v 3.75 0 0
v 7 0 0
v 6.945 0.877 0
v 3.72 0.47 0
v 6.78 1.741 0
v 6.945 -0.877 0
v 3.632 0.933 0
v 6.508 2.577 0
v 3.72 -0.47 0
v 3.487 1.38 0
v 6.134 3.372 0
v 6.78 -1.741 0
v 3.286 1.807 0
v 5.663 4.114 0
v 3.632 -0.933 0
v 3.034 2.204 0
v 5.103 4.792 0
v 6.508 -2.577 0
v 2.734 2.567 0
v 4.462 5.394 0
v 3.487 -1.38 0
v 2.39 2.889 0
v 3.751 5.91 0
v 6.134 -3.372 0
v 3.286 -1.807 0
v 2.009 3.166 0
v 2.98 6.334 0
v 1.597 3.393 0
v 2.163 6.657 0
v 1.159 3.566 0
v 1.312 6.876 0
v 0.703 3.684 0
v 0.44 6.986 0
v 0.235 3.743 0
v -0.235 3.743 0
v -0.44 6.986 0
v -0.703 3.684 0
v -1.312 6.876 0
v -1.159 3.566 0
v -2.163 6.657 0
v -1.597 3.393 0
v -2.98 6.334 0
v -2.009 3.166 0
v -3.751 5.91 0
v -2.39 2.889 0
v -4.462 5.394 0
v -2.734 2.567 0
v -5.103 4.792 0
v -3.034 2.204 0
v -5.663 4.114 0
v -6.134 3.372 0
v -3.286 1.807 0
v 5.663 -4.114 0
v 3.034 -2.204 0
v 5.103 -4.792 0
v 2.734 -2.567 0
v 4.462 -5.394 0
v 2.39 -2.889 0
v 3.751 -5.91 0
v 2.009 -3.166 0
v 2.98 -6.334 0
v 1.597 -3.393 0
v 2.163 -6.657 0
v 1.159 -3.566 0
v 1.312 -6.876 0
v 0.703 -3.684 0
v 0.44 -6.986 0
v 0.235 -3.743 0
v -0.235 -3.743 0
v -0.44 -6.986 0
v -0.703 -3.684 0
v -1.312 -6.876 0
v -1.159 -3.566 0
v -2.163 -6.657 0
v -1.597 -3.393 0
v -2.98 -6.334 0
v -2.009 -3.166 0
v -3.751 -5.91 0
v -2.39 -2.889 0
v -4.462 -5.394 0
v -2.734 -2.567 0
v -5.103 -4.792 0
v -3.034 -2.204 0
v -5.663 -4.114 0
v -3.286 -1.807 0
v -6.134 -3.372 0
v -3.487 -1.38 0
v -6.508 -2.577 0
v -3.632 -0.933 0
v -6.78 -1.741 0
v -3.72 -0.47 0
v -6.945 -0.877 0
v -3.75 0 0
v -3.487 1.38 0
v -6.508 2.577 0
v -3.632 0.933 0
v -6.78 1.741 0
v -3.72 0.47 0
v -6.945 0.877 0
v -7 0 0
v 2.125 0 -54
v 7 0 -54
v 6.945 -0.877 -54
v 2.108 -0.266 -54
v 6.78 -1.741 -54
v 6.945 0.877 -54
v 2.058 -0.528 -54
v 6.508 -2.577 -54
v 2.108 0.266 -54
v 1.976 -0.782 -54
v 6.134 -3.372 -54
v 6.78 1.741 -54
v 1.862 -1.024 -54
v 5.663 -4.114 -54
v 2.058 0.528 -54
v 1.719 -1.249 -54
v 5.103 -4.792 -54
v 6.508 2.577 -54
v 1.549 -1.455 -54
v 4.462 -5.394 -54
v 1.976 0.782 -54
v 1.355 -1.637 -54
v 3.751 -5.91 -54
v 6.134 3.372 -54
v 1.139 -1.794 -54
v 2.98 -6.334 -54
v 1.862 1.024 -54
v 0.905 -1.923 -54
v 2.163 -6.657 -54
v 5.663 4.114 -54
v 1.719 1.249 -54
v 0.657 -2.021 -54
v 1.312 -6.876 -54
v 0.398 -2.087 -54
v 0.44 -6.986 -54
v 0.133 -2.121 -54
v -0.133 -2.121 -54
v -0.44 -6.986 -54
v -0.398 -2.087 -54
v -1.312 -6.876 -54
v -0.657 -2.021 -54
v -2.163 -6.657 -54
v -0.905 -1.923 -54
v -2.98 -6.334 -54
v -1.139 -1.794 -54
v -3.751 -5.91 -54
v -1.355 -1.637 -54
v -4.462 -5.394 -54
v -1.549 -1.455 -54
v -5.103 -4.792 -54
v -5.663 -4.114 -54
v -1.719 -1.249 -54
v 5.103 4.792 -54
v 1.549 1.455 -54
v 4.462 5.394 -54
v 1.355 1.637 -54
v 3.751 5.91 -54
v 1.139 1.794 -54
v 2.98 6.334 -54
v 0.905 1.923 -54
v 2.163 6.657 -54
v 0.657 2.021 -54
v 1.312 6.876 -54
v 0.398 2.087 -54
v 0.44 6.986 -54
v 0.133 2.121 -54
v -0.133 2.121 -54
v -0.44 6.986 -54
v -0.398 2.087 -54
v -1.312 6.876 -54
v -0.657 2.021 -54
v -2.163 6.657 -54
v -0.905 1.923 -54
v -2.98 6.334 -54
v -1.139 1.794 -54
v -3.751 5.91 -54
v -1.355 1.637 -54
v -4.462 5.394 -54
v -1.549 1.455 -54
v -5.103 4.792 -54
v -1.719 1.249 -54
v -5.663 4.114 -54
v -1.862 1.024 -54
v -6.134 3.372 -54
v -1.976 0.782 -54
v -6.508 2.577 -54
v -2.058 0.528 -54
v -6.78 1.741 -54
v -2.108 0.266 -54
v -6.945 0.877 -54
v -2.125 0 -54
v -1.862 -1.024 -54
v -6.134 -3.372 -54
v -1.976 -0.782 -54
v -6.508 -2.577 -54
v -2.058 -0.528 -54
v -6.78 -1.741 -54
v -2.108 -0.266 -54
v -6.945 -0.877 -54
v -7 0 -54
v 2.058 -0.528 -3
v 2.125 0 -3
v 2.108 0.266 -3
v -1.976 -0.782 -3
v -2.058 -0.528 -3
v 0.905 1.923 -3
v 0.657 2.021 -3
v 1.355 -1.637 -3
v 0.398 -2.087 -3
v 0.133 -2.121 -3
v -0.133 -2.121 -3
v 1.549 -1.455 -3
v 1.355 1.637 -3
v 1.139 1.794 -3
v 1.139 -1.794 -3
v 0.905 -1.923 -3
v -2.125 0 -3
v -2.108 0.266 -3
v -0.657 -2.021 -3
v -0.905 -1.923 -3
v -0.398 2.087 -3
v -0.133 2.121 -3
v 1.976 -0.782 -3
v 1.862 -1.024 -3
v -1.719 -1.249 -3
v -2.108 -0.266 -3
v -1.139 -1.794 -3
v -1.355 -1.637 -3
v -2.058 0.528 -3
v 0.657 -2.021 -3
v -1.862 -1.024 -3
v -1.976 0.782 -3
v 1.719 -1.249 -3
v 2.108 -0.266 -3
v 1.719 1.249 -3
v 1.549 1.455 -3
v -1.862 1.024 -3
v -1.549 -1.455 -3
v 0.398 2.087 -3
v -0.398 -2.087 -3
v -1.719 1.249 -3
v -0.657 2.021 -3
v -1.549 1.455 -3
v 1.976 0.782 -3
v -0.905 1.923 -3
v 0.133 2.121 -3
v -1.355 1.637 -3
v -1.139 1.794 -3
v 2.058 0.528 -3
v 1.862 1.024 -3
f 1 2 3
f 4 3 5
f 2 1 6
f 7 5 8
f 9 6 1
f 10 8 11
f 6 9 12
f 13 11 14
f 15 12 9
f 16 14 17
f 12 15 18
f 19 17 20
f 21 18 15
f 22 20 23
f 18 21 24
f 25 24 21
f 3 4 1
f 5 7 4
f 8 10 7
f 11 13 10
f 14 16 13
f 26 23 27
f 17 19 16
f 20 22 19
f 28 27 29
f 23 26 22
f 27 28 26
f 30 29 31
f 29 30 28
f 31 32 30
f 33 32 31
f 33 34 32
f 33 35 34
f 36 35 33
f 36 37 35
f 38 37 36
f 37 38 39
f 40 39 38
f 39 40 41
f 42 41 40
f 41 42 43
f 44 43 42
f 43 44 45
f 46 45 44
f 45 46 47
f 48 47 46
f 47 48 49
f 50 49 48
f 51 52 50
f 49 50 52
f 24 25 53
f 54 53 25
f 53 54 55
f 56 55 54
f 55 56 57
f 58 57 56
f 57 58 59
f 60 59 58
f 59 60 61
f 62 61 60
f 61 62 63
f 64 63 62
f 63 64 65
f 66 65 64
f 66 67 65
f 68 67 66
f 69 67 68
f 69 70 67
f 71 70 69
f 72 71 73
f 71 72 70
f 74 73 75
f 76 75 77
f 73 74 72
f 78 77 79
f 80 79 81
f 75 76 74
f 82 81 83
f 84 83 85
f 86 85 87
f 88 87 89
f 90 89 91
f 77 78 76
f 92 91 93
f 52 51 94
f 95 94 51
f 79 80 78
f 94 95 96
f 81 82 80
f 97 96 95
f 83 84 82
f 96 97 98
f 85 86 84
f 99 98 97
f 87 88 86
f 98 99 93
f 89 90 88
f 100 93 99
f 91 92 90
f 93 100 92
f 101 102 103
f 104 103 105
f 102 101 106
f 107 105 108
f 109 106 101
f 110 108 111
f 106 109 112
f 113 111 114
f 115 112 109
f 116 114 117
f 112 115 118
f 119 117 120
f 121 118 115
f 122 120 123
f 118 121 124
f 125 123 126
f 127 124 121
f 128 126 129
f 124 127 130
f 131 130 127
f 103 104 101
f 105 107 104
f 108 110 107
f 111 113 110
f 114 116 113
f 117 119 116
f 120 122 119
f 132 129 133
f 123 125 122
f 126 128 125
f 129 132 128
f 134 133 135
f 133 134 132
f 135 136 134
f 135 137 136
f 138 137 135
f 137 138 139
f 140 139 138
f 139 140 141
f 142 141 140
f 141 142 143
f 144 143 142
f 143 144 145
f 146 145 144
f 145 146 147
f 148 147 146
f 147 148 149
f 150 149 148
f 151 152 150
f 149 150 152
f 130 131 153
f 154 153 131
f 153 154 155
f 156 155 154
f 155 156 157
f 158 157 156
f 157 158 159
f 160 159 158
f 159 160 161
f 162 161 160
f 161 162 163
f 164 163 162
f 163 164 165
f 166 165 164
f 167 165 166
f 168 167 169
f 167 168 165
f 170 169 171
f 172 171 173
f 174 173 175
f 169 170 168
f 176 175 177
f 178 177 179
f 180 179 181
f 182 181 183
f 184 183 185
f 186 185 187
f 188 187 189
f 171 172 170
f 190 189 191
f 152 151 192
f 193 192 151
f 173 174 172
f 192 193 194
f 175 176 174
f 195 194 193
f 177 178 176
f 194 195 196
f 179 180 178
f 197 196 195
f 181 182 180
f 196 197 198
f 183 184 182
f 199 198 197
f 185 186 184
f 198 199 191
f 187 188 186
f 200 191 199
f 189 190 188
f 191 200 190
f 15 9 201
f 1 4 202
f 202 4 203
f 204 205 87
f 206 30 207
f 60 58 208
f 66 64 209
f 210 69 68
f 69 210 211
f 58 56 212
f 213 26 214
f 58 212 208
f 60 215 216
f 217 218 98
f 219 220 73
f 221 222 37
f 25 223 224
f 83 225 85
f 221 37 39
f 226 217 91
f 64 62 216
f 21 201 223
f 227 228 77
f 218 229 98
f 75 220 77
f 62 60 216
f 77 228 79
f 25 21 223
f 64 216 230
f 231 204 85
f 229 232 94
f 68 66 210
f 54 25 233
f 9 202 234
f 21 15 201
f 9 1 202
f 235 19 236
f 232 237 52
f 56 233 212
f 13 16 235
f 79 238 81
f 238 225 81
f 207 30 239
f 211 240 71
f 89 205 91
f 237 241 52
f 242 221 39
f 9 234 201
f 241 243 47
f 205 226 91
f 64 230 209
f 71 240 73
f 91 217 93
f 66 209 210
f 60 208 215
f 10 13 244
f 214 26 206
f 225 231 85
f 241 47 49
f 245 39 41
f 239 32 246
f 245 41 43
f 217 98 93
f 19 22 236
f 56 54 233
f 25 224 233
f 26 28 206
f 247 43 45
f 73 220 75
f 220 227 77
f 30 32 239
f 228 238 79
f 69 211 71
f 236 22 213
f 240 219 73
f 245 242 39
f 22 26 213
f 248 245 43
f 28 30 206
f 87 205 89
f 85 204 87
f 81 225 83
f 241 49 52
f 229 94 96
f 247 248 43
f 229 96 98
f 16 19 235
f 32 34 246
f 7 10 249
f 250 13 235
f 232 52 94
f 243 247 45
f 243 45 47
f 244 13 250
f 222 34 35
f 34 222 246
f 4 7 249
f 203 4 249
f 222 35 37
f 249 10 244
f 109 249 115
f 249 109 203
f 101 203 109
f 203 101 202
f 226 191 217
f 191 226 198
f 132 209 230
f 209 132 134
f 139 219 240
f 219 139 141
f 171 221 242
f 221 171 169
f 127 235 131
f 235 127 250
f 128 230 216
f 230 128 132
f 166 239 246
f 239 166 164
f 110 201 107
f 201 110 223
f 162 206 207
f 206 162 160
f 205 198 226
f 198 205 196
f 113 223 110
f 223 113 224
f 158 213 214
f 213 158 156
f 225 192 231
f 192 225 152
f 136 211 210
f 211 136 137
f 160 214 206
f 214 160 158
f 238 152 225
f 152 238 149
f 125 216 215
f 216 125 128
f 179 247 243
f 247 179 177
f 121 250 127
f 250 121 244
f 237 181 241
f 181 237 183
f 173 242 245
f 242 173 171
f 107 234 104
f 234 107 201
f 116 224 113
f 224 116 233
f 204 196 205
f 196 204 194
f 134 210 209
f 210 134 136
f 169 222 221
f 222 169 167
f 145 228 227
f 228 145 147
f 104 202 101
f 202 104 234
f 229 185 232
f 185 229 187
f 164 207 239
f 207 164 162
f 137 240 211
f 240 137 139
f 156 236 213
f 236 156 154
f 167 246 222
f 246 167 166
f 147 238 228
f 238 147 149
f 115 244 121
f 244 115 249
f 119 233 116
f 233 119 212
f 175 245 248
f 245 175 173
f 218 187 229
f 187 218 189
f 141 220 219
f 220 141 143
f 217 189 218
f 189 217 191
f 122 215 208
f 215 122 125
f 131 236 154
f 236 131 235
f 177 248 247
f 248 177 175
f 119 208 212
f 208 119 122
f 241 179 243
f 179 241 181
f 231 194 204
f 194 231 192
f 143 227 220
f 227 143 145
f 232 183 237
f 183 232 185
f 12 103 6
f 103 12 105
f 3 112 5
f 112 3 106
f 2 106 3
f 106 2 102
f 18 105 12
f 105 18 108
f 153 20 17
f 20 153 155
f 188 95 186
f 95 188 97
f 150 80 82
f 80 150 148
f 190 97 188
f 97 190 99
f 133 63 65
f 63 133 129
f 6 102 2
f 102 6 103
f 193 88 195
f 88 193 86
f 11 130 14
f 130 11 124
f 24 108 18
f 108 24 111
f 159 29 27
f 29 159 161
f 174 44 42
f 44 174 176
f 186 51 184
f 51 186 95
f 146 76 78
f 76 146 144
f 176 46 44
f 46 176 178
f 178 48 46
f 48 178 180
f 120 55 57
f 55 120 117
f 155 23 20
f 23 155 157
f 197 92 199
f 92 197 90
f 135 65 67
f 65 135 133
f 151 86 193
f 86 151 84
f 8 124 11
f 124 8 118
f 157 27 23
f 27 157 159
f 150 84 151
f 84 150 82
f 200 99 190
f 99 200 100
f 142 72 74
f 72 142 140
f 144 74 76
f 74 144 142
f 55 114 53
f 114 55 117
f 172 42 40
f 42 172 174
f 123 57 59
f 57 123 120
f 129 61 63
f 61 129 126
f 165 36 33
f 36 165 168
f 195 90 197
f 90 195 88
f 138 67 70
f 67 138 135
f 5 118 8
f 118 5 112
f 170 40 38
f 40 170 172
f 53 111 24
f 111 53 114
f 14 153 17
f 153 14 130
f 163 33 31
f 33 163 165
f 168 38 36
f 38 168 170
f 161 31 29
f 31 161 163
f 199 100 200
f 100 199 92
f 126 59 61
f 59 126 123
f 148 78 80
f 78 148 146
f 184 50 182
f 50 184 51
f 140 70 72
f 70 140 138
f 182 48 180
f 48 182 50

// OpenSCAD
$fn = 50;


difference() {
	union() {
		translate(v = [0, 0, -54.0000000000]) {
			cylinder(h = 54, r = 7.0000000000);
		}
		cylinder(h = 0, r = 17.0000000000);
	}
	union() {
		translate(v = [0, 0, 0]) {
			rotate(a = [0, 0, 0]) {
				difference() {
					union() {
						#translate(v = [0, 0, -54.0000000000]) {
							cylinder(h = 54, r = 2.0000000000);
						}
						#translate(v = [0, 0, -3]) {
							cylinder(h = 3, r1 = 2.1250000000, r2 = 3.7500000000);
						}
						#translate(v = [0, 0, -54.0000000000]) {
							cylinder(h = 54, r = 2.1250000000);
						}
						#translate(v = [0, 0, -54.0000000000]) {
							cylinder(h = 54, r = 2.0000000000);
						}
					}
					union();
				}
			}
		}
	}
}
